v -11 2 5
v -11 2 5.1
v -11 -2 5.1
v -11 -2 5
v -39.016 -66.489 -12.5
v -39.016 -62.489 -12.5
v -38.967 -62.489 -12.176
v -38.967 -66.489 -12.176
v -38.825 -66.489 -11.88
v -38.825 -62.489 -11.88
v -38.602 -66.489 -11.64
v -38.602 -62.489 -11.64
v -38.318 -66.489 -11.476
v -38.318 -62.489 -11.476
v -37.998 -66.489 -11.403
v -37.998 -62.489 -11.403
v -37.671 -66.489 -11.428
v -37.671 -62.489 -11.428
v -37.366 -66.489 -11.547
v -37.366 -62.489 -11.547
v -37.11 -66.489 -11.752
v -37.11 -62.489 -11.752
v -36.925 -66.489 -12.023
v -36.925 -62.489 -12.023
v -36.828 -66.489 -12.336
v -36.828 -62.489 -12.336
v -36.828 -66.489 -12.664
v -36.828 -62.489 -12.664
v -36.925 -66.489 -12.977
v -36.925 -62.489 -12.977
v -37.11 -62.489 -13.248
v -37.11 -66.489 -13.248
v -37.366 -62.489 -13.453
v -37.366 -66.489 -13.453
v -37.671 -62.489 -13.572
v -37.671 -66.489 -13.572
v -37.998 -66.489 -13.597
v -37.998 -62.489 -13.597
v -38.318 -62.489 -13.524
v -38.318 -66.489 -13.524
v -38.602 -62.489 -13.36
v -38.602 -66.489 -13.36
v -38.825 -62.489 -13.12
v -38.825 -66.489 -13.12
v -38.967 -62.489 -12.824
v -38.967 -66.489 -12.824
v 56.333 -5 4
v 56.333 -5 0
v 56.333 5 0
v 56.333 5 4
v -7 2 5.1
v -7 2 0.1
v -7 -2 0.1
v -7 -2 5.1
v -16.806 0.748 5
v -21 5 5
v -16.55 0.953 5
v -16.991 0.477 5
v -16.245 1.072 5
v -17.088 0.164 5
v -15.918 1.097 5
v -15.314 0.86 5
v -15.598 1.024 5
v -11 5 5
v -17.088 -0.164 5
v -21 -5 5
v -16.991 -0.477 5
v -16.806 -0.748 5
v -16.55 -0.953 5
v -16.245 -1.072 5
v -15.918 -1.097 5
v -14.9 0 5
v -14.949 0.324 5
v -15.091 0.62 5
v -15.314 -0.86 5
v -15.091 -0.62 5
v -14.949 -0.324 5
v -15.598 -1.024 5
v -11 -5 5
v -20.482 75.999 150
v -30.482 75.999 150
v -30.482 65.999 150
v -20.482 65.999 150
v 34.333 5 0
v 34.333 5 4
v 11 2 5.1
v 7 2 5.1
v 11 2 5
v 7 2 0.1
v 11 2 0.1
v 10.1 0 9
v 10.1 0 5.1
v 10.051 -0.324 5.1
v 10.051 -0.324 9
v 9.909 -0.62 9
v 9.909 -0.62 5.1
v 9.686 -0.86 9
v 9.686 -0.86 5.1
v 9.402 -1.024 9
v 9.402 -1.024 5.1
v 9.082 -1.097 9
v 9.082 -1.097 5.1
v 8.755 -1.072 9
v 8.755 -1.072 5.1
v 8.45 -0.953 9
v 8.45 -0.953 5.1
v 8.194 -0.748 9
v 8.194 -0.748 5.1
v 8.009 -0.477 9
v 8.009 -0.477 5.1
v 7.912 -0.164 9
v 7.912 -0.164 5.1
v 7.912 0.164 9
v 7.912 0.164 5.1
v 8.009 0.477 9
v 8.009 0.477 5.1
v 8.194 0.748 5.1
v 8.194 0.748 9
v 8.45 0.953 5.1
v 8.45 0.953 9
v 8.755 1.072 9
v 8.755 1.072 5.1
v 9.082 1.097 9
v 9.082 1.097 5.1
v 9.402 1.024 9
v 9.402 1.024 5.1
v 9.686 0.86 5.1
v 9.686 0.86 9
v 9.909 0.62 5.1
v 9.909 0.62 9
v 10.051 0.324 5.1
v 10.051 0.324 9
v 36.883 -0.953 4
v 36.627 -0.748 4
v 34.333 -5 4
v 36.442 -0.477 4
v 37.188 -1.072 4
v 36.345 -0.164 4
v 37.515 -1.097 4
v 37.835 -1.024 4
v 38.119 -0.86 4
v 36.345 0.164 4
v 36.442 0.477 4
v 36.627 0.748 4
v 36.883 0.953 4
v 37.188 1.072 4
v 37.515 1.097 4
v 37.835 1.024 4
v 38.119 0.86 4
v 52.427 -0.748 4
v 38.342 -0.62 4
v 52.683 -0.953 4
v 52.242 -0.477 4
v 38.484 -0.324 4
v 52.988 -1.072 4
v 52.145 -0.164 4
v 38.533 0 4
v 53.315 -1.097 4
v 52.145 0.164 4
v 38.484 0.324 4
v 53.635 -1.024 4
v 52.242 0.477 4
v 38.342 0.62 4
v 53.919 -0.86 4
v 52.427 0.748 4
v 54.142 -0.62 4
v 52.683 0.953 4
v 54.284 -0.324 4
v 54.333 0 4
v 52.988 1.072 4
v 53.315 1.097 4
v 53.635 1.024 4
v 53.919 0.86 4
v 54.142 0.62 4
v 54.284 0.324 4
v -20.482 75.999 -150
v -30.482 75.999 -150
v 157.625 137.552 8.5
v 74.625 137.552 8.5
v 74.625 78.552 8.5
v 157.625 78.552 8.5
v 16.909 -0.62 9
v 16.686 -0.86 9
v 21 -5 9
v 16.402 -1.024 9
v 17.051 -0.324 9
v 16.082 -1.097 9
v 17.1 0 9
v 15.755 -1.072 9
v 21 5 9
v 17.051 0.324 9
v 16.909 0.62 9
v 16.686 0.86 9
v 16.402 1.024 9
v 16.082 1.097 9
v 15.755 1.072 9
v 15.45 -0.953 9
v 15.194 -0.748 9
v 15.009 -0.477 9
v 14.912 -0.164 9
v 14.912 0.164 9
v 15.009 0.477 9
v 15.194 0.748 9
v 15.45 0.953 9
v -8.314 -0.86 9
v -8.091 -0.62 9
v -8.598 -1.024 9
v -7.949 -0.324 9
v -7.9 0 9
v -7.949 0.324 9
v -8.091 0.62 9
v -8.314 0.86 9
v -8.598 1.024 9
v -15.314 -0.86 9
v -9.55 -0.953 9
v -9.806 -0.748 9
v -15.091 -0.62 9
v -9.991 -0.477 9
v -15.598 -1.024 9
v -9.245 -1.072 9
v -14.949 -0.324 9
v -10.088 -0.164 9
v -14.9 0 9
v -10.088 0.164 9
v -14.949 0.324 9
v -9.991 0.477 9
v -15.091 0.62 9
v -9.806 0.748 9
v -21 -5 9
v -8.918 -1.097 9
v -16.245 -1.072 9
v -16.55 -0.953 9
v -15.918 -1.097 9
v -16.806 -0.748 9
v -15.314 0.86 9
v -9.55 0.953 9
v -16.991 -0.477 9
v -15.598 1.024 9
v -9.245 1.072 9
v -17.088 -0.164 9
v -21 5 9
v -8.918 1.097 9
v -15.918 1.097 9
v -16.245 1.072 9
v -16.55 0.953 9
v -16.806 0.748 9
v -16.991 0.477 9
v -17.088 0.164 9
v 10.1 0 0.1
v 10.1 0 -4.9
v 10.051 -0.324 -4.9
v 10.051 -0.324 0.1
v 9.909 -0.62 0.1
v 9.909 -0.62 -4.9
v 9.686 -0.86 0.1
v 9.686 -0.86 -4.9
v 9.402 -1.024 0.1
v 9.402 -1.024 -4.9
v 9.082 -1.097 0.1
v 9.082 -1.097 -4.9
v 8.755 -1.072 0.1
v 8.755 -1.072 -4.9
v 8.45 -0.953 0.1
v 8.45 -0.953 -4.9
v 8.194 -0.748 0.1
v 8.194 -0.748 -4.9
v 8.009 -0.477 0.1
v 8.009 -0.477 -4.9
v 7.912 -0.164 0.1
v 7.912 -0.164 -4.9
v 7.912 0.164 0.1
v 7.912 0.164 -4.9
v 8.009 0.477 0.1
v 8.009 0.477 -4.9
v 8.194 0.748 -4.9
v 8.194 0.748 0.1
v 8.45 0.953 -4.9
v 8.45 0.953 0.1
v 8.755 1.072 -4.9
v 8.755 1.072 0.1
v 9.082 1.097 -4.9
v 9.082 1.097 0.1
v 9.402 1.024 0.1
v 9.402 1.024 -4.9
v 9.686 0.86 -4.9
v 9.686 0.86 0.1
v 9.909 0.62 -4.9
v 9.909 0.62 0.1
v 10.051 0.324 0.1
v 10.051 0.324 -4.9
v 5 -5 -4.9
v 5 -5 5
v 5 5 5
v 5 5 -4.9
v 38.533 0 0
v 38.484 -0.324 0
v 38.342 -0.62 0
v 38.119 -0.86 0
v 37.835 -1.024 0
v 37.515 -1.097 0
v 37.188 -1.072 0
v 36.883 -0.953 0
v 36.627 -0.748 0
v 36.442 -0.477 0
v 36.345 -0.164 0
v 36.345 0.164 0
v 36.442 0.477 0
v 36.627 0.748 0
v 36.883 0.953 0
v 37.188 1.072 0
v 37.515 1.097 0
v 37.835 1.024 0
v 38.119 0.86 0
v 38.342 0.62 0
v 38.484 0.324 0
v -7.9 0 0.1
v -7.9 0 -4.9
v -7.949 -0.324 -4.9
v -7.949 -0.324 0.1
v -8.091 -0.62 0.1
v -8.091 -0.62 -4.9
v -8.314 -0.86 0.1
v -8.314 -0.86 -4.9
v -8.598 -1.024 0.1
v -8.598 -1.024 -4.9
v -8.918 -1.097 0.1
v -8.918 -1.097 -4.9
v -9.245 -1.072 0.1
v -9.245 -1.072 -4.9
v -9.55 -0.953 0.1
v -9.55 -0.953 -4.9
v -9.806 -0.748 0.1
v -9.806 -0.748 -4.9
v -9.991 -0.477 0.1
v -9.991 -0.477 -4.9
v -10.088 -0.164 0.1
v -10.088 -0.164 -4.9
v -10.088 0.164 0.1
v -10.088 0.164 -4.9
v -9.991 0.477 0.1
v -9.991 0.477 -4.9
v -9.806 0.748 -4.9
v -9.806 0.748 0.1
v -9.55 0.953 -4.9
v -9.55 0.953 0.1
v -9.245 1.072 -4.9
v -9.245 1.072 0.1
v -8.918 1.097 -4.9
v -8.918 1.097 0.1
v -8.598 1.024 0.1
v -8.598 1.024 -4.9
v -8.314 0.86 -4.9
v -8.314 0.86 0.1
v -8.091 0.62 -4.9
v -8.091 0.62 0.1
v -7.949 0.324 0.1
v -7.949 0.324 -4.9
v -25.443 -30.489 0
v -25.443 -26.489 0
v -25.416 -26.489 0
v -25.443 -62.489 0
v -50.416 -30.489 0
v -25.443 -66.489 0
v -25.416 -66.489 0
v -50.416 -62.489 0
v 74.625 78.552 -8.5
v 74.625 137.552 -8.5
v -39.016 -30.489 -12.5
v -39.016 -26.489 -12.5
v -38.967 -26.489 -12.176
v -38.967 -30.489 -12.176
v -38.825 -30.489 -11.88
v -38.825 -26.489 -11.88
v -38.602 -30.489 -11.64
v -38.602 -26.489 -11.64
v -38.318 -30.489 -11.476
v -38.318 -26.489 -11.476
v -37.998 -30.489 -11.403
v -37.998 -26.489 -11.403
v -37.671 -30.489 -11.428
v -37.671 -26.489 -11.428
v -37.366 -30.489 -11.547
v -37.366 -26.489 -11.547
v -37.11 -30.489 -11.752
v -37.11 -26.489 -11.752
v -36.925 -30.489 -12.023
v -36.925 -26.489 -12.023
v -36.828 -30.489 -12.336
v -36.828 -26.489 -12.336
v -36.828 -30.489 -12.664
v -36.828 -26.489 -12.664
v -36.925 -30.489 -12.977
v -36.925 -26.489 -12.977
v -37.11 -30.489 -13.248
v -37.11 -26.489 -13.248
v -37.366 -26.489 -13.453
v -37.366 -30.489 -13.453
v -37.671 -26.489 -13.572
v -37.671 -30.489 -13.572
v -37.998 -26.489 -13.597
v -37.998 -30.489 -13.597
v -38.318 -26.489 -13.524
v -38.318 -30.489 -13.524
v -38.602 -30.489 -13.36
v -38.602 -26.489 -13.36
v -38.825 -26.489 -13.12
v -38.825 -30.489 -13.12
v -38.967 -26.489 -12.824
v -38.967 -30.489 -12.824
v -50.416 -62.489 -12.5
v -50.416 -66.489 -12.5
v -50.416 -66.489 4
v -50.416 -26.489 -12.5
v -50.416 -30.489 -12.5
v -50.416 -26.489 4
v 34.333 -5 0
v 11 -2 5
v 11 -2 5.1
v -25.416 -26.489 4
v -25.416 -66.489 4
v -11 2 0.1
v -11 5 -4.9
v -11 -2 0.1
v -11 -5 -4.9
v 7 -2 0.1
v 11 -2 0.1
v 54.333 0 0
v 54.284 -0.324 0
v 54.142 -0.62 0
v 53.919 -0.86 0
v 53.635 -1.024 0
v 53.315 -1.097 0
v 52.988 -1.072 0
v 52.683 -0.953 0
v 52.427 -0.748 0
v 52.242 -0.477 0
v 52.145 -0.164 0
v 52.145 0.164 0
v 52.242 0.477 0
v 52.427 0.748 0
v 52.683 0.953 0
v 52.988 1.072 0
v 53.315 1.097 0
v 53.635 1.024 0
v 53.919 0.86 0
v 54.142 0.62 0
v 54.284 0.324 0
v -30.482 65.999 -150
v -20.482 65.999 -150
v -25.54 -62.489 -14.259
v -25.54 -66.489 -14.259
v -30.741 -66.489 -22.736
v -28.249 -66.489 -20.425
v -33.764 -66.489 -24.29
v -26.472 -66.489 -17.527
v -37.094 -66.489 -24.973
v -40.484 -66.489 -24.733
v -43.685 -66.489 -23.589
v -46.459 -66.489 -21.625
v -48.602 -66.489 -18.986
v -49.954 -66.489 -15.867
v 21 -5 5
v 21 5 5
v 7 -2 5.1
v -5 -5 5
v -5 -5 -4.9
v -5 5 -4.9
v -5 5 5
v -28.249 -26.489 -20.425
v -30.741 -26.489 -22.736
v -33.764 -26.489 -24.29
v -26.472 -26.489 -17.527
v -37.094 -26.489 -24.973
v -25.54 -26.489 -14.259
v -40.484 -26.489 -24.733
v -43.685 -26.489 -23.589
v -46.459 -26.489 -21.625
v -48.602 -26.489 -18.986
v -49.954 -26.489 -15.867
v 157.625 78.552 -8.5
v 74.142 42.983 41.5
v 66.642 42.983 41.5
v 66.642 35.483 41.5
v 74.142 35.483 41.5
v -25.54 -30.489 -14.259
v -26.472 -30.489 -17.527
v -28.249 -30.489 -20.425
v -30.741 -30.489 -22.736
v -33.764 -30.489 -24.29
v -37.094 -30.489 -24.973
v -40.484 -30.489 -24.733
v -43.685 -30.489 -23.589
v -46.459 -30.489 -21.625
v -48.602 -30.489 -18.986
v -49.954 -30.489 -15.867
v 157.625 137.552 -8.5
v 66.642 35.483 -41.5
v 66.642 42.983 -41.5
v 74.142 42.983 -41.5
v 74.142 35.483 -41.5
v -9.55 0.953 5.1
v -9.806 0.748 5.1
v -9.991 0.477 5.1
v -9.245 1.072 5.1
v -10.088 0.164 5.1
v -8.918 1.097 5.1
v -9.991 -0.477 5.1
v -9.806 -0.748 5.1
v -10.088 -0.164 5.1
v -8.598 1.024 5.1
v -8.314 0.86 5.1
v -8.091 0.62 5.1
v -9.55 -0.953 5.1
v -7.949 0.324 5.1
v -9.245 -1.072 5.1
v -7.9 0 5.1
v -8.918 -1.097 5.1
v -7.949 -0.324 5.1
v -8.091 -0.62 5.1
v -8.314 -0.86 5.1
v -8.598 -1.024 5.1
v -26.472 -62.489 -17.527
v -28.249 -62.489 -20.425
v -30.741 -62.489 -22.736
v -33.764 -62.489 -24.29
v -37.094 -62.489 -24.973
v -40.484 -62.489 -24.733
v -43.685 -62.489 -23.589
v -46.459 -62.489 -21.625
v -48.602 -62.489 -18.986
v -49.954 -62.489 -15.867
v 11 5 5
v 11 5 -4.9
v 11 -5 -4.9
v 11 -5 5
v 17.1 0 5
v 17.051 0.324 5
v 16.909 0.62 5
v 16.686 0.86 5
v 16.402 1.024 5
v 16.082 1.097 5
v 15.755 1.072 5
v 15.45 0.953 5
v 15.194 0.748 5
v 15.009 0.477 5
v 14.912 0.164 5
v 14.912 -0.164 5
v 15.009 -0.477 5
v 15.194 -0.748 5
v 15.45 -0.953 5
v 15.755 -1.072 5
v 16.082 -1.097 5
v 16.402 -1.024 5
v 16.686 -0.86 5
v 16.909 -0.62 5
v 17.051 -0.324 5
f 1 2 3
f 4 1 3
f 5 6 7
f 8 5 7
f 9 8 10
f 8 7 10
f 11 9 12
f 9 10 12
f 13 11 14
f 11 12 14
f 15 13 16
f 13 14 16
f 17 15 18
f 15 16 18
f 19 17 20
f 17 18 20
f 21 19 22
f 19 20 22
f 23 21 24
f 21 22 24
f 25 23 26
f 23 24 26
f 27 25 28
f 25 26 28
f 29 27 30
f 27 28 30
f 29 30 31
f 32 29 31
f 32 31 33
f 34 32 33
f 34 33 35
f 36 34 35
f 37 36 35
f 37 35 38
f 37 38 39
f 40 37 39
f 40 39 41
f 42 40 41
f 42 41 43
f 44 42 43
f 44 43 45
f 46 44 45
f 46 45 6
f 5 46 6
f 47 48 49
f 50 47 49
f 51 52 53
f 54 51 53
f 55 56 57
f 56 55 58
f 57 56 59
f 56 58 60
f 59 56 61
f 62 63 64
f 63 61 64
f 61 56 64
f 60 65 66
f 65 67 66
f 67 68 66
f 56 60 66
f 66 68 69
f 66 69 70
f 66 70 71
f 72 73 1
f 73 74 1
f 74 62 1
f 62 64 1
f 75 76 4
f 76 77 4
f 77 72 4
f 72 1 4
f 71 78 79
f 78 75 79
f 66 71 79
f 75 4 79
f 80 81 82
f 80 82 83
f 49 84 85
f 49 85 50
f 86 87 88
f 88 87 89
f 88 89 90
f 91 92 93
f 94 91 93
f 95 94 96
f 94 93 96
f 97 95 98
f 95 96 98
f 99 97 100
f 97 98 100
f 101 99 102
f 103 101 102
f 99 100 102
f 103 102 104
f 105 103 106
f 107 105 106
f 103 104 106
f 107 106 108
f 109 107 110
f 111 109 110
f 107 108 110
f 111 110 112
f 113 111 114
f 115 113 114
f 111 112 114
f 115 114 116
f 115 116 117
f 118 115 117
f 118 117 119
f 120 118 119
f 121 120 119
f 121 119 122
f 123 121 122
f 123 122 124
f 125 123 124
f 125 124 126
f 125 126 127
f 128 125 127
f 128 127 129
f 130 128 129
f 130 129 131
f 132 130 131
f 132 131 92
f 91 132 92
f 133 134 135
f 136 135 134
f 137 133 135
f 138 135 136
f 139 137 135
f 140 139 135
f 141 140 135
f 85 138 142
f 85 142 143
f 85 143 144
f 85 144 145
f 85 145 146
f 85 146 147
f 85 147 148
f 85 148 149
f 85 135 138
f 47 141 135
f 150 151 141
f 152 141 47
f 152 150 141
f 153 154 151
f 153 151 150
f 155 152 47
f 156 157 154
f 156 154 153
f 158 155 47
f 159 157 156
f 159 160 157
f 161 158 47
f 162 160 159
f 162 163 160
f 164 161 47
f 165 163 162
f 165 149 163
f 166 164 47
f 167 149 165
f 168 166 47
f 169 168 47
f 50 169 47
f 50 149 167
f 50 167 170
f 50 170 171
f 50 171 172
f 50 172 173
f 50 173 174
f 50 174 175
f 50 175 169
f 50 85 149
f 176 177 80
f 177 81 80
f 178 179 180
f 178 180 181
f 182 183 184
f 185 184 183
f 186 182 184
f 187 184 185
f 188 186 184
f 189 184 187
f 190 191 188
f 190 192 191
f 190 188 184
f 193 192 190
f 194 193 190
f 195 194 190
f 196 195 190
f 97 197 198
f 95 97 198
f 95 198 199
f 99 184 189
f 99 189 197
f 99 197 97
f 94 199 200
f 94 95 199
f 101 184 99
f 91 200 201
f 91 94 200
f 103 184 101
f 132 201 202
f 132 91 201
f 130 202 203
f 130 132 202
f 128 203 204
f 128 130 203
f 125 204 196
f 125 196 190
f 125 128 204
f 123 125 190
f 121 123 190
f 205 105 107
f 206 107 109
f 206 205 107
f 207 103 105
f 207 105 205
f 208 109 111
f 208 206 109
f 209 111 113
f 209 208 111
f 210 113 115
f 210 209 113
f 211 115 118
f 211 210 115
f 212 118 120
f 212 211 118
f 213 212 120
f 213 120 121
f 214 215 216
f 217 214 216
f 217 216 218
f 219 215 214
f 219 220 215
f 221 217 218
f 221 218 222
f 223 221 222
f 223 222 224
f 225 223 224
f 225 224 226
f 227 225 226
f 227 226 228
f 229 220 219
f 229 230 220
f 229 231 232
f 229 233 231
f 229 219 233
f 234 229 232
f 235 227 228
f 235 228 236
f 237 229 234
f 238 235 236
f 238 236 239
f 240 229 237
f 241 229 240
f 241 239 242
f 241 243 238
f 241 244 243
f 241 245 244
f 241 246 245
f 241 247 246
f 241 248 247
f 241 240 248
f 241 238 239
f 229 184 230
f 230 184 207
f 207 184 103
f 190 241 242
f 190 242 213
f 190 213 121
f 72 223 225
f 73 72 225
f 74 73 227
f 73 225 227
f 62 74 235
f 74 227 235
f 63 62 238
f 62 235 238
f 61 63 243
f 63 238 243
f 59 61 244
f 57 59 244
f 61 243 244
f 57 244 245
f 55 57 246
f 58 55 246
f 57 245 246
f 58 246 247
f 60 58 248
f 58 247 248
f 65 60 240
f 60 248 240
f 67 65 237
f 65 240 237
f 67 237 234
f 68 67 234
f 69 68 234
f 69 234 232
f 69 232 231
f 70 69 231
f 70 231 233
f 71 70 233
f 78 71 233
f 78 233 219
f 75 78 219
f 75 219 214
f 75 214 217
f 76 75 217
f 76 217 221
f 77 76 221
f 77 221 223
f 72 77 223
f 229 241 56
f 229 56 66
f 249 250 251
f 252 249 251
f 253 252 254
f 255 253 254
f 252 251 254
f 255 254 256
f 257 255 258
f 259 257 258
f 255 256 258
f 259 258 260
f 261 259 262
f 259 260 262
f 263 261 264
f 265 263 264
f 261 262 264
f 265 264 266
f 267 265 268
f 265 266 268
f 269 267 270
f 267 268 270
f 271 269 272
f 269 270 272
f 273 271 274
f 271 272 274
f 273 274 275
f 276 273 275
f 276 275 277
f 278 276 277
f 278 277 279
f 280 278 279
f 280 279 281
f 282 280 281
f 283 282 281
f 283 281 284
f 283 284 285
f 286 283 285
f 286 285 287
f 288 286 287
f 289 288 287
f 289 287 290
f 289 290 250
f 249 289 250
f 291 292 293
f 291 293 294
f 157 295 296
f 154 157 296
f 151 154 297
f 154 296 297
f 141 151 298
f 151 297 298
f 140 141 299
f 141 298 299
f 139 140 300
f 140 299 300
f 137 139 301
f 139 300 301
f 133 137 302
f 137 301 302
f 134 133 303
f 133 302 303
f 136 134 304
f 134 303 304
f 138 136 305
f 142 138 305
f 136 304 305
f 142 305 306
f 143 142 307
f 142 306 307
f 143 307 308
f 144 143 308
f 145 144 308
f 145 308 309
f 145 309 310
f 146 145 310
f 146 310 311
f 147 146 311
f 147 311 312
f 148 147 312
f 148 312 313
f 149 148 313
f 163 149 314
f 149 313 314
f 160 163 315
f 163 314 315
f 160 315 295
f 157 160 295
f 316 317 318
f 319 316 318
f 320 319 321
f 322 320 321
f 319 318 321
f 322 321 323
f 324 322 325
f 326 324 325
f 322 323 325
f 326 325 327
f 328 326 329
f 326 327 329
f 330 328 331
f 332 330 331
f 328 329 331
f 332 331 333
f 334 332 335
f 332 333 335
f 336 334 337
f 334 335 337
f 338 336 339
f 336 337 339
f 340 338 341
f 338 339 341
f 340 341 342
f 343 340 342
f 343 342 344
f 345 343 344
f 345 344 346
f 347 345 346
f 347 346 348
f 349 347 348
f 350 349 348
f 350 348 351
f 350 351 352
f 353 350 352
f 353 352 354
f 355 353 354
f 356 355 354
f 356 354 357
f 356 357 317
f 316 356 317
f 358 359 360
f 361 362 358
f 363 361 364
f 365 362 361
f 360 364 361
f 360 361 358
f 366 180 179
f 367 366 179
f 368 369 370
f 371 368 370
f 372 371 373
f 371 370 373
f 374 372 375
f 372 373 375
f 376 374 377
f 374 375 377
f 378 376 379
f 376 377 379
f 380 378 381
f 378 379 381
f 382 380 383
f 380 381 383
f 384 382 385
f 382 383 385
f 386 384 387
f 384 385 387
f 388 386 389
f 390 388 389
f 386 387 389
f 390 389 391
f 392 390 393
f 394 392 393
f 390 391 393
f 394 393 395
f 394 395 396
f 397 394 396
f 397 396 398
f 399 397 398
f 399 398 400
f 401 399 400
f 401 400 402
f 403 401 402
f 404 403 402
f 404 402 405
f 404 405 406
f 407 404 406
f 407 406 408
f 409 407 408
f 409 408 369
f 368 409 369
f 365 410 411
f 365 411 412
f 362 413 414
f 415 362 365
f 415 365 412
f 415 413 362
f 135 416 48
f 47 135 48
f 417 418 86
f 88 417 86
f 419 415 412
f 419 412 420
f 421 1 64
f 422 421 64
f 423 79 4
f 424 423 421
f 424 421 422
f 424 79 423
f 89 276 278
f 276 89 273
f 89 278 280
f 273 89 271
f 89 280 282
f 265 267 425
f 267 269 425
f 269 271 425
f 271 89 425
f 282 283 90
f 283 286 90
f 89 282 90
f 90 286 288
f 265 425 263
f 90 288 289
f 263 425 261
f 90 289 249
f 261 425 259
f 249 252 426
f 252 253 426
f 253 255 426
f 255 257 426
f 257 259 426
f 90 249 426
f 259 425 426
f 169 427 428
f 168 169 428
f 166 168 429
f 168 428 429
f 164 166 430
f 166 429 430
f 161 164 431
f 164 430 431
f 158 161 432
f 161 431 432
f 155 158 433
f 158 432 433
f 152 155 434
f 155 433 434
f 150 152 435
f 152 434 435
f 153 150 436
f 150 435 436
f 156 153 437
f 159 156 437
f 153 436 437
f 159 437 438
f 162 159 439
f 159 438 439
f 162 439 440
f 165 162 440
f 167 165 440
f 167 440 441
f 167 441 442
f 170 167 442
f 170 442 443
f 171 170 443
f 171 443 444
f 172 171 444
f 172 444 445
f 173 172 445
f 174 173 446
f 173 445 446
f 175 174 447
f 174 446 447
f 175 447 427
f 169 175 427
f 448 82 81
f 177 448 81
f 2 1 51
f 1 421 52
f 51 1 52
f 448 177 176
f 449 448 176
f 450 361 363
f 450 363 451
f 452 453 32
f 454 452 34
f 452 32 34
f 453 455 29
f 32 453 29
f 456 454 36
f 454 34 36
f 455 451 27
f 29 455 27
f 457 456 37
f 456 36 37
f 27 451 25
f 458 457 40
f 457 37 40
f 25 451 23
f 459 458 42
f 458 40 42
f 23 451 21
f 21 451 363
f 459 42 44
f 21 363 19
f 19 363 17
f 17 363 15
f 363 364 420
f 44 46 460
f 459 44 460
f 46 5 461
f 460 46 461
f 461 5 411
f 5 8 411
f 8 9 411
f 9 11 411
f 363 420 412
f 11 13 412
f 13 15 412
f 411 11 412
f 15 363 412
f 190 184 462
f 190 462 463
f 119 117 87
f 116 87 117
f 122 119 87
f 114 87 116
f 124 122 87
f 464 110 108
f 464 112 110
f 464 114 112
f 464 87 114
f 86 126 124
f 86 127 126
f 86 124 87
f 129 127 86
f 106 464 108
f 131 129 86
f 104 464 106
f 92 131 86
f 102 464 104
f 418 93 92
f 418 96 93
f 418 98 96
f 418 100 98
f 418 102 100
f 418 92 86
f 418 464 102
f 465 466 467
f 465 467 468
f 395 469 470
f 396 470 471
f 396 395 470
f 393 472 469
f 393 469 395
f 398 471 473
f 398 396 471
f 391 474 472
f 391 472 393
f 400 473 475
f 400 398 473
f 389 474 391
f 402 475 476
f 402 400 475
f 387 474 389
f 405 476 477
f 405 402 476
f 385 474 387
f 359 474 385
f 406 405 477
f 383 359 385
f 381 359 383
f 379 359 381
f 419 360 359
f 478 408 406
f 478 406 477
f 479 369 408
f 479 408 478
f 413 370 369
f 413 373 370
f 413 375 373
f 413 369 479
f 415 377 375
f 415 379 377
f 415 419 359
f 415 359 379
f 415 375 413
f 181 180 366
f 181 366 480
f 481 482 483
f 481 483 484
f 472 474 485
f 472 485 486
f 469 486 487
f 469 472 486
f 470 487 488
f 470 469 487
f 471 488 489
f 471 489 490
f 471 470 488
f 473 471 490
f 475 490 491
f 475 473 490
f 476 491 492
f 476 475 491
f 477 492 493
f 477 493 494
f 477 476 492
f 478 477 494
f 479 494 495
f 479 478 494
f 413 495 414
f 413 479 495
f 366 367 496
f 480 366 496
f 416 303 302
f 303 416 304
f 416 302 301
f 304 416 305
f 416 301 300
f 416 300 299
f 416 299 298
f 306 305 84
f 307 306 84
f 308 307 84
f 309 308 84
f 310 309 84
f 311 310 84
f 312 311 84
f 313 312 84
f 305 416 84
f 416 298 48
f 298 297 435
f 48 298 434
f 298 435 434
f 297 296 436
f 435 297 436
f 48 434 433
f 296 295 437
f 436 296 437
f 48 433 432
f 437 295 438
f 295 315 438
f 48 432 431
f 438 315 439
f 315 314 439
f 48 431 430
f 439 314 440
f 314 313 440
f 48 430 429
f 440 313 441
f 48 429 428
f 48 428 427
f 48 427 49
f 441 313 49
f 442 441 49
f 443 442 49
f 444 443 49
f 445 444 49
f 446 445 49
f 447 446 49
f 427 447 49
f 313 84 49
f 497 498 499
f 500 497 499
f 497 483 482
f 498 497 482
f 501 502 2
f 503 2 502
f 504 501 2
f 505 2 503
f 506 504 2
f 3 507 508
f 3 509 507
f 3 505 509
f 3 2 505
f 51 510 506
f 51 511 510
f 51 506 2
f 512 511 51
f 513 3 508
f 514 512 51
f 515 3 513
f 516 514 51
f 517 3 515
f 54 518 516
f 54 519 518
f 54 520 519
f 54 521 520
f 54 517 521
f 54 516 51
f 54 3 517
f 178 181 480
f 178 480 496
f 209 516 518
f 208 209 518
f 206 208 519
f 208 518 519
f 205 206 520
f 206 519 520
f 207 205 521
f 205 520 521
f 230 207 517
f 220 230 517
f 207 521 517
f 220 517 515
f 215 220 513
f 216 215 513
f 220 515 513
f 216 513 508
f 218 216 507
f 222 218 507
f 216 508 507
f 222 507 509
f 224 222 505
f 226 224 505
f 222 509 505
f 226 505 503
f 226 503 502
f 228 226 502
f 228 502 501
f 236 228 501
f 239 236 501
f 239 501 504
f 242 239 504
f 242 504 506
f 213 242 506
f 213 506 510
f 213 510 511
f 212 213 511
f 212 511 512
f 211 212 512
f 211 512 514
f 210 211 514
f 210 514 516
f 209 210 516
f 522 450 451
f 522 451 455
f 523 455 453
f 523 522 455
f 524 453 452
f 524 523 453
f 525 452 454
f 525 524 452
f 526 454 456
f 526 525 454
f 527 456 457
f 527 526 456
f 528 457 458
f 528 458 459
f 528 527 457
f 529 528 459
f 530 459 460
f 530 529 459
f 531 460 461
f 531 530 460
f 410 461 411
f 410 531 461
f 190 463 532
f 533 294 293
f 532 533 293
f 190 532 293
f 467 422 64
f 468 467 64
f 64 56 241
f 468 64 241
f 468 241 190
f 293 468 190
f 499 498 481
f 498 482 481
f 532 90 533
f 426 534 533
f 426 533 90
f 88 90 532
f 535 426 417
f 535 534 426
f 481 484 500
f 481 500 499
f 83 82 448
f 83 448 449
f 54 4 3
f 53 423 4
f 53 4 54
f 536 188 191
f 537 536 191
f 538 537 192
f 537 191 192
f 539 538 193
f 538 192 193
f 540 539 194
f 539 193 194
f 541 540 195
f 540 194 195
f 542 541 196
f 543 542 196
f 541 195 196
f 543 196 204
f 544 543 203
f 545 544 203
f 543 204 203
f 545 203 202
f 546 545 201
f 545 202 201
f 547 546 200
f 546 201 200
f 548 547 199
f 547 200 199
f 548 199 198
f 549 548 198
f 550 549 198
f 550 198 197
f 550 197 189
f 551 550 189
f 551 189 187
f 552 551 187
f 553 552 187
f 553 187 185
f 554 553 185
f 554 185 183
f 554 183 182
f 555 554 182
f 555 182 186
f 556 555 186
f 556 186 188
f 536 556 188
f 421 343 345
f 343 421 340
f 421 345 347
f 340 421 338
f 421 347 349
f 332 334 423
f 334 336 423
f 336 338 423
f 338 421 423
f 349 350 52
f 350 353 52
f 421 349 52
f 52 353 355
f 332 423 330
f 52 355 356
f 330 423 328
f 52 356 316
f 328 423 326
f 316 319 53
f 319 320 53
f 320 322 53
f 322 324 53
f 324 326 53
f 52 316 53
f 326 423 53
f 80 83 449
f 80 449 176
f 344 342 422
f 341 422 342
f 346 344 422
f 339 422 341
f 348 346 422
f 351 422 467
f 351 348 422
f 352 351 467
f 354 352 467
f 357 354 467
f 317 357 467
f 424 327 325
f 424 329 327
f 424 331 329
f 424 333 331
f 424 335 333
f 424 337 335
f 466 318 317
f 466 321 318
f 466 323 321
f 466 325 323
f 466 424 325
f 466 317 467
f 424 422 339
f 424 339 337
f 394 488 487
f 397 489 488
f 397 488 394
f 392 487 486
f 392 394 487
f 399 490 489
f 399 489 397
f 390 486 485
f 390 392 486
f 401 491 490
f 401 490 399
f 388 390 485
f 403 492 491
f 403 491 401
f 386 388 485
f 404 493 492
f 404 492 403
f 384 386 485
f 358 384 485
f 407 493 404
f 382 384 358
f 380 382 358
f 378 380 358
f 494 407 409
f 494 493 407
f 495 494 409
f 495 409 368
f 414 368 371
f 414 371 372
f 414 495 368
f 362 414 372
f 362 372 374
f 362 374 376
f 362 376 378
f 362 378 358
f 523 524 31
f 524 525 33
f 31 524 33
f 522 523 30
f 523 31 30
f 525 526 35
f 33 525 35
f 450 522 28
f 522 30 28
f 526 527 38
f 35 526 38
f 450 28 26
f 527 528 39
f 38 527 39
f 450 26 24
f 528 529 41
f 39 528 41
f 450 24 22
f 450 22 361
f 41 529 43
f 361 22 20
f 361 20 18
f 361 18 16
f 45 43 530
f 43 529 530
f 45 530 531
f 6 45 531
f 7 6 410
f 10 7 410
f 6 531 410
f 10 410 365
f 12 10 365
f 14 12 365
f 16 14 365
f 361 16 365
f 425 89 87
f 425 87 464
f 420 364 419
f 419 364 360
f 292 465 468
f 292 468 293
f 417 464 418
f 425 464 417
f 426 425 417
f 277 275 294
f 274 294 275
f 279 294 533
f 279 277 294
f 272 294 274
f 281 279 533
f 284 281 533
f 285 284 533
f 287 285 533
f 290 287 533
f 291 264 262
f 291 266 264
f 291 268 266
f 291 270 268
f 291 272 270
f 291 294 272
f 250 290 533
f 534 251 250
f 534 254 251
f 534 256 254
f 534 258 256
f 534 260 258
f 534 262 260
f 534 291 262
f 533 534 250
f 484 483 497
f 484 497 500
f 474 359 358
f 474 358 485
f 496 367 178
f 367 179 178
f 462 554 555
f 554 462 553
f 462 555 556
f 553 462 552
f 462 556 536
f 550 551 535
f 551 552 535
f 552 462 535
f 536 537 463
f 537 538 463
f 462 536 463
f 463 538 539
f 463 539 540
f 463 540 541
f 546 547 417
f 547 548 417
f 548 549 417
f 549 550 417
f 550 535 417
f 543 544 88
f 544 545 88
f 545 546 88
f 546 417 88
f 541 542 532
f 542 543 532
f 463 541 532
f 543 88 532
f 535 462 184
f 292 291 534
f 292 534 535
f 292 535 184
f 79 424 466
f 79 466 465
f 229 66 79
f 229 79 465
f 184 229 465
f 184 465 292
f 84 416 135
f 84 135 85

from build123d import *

# Parameters (mm, degrees)
F3_DEPTH  = 5
F4_R      = 1.1
F5_DEPTH  = 13.901
F6_START  = -5
F4_W      = 4
F4_H      = 4
F6_DEPTH  = 5
F7_W      = 22
F7_H      = 10
F8_DEPTH  = 4
F9_W      = 10
F9_H      = 4
F11_DEPTH = 10
F10_W     = 10
F10_H     = 4
F12_DEPTH = 10
F13_W     = 25
F13_H     = 40
F14_DEPTH = 4
F16_DEPTH = 40
F17_W     = 32
F17_H     = 40
F18_DEPTH = 25
F19_W     = 10
F19_H     = 10
F20_DEPTH = 150
F21_R     = 1.1
F22_DEPTH = 40.001
F23_R     = 1.1
F24_DEPTH = 159.001
F25_W     = 83
F25_H     = 59
F26_DEPTH = 8.5
F27_R     = 1.1
F28_DEPTH = 4
F29_W     = 7.5
F29_H     = 7.5
F30_DEPTH = 41.5


with BuildPart() as f3:
    # F2 (on Front) → F3 (new body, symmetric)
    with BuildSketch(Plane.XZ):
        Polygon((-11, -4.9), (-5, -4.9), (-5, 5), (5, 5), (5, -4.9), (11, -4.9), (11, 9), (-11, 9), align=None)
    extrude(amount=F3_DEPTH, both=True)

    # F4 (on face) → F5 (cut, through all)
    with BuildSketch(Plane(origin=(0, 0, -4.9), x_dir=(1, 0, 0), z_dir=(0, 0, -1))):
        with Locations((-9, 0)):
            Circle(F4_R)
        with Locations((9, 0)):
            Circle(F4_R)
    extrude(amount=-F5_DEPTH, mode=Mode.SUBTRACT)

    # F4 (on face) → F6 (cut)
    with BuildSketch(Plane(origin=(0, 0, -4.9), x_dir=(1, 0, 0), z_dir=(0, 0, -1)).offset(F6_START)):
        with Locations((-9, 0)):
            Rectangle(F4_W, F4_H)
        with Locations((-9, 0)):
            Circle(F4_R, mode=Mode.SUBTRACT)
        with Locations((9, 0)):
            Rectangle(F4_W, F4_H)
        with Locations((9, 0)):
            Circle(F4_R, mode=Mode.SUBTRACT)
    extrude(amount=-F6_DEPTH, mode=Mode.SUBTRACT)

    # F9 (on face) → F11 (join)
    with BuildSketch(Plane(origin=(-11, 0, 0), x_dir=(0, -1, 0), z_dir=(-1, 0, 0))):
        with Locations((0, 7)):
            Rectangle(F9_W, F9_H)
    extrude(amount=F11_DEPTH)

    # F10 (on face) → F12 (join)
    with BuildSketch(Plane.YZ.offset(11)):
        with Locations((0, 7)):
            Rectangle(F10_W, F10_H)
    extrude(amount=F12_DEPTH)

    # F23 (on face) → F24 (cut, through all)
    with BuildSketch(Plane.XY.offset(9)):
        with Locations((-16, 0)):
            Circle(F23_R)
        with Locations((16, 0)):
            Circle(F23_R)
    extrude(amount=-F24_DEPTH, mode=Mode.SUBTRACT)


with BuildPart() as f8:
    # F7 (on Top) → F8 (new body)
    with BuildSketch(Plane.XY):
        with Locations((45.3331142285, 0)):
            Rectangle(F7_W, F7_H)
    extrude(amount=F8_DEPTH)

    # F27 (on face) → F28 (cut, through all)
    with BuildSketch(Plane(origin=(0, 0, 0), x_dir=(1, 0, 0), z_dir=(0, 0, -1))):
        with Locations((37.4331142285, 0)):
            Circle(F27_R)
        with Locations((53.2331142285, 0)):
            Circle(F27_R)
    extrude(amount=-F28_DEPTH, mode=Mode.SUBTRACT)


with BuildPart() as f14:
    # F13 (on Top) → F14 (new body)
    with BuildSketch(Plane.XY):
        with Locations((-37.9159292206, -46.4893170172)):
            Rectangle(F13_W, F13_H)
    extrude(amount=F14_DEPTH)

    # F15 (on face) → F16 (join)
    with BuildSketch(Plane(origin=(0, -26.4893170172, 0), x_dir=(-1, 0, 0), z_dir=(0, 1, 0))):
        with BuildLine():
            Line((50.4159292206, -12.5), (50.4159292206, 0))
            Line((50.4159292206, 0), (25.4431634574, 0))
            Line((25.4431634574, 0), (25.5402434528, -14.2585226116))
            ThreePointArc((25.5402434528, -14.2585226116), (38.7973848071, -24.9688827105), (50.4159292206, -12.5))
        make_face()
    extrude(amount=-F16_DEPTH)

    # F17 (on face) → F18 (cut)
    with BuildSketch(Plane(origin=(-50.4159292206, 0, 0), x_dir=(0, -1, 0), z_dir=(-1, 0, 0))):
        with Locations((46.4893170172, -20)):
            Rectangle(F17_W, F17_H)
    extrude(amount=-F18_DEPTH, mode=Mode.SUBTRACT)

    # F21 (on face) → F22 (cut, through all)
    with BuildSketch(Plane(origin=(0, -26.4893170172, 0), x_dir=(-1, 0, 0), z_dir=(0, 1, 0))):
        with Locations((37.9159292206, -12.5)):
            Circle(F21_R)
    extrude(amount=-F22_DEPTH, mode=Mode.SUBTRACT)


with BuildPart() as f20:
    # F19 (on Top) → F20 (new body, symmetric)
    with BuildSketch(Plane.XY):
        with Locations((-25.4819318652, 70.9985667586)):
            Rectangle(F19_W, F19_H)
    extrude(amount=F20_DEPTH, both=True)


with BuildPart() as f26:
    # F25 (on Top) → F26 (new body, symmetric)
    with BuildSketch(Plane.XY):
        with Locations((116.1254188728, 108.0518476665)):
            Rectangle(F25_W, F25_H)
    extrude(amount=F26_DEPTH, both=True)


with BuildPart() as f30:
    # F29 (on Top) → F30 (new body, symmetric)
    with BuildSketch(Plane.XY):
        with Locations((70.3924739473, 39.2330829054)):
            Rectangle(F29_W, F29_H)
    extrude(amount=F30_DEPTH, both=True)


solid = Compound([f3.part, f8.part, f14.part, f20.part, f26.part, f30.part])
